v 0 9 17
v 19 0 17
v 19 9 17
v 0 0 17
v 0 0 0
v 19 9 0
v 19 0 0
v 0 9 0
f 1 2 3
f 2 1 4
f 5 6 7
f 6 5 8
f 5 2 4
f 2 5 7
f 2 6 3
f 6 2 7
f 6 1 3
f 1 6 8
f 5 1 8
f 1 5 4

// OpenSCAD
// Generated by SolidPython 1.0.1 on 2020-07-29 00:46:56


cube(size = [19, 9, 17]);
/***********************************************
*********      SolidPython code:      **********
************************************************
 
# import packages: SolidPython
from solid import *
from solid.utils import *
from itertools import chain, combinations, permutations


class Resize:

    def __init__(self, scad_file):
        self.scad_file = scad_file
        #self.scad_file = import_scad(scad_file)
        # cone/cylinder param:
        self.r1 = 0
        self.r2 = 0
        self.h = 0
        # rectangular prism param:
        self.w = 0
        self.l = 0
        # ellipse param:
        self.r = 0

    # import OpenScad code (file name corresponds to shape)


    # classify shape + parameters
    def assign(self, param1, param2, param3):
        if self.scad_file == 'cone.scad':
            self.r1 = param1
            self.r2 = param2
            self.h = param3
        elif self.scad_file == 'cylinder.scad':
            self.r1 = param1
            self.r2 = param2
            self.h = param3
        elif self.scad_file == 'rectangularPrism.scad':
            self.h = param1
            self.l = param2
            self.w = param3
        else:
            self.r = param1
            self.h = param2

    # resize parameters
    def iterate(self):
        x = range(3, 20, 2)
        i = 1
        if self.scad_file == 'cone.scad':
            tempList = list(permutations(x, 2))
            for temp in tempList:
                param1 = temp[0]
                param2 = temp[1]
                filepath = 'produced_scad_files/' + 'cone' + str(param1) + '_' + str(param2) + '_' + '.scad'
                scad_render_to_file(cylinder(h=param1, r1=param2, r2=0), filepath)

        elif self.scad_file == 'cylinder.scad':
            tempList = list(permutations(x, 3))
            for temp in tempList:
                param1 = temp[0]
                param2 = temp[1]
                filepath = 'produced_scad_files/' + 'cylinder' + str(param1) + '_' + str(param2) + '_' + '.scad'
                scad_render_to_file(cylinder(h=param1, r1=param2, r2=param2), filepath)

        elif self.scad_file == 'rectangularPrism.scad':
            tempList = list(permutations(x, 3))
            for temp in tempList:
                param1 = temp[0]
                param2 = temp[1]
                param3 = temp[2]
                filepath = 'produced_scad_files/' + 'rectangularPrism' + str(param1) + '_' + str(param2) + '_' + str(
                    param3) + '.scad'
                scad_render_to_file(cube(size=(param1, param2, param3)), filepath)

        elif self.scad_file == 'ellipse.scad':
            tempList = list(permutations(x, 4))
            for temp in tempList:
                param1 = temp[0]
                param2 = temp[1]
                param3 = temp[2]
                param4 = temp[3]
                filepath = 'produced_scad_files/' + 'ellipse' + str(param1) + '_' + str(param2) + '_' + str(param3) + '_' + str(param4) + '.scad'
                scad_render_to_file(scale([param1, param2, param3])(sphere(r=param4)), filepath)

    def render_to_scadfile(self):
        scad_render_to_file(scad, 'example.scad') 
 
************************************************/
